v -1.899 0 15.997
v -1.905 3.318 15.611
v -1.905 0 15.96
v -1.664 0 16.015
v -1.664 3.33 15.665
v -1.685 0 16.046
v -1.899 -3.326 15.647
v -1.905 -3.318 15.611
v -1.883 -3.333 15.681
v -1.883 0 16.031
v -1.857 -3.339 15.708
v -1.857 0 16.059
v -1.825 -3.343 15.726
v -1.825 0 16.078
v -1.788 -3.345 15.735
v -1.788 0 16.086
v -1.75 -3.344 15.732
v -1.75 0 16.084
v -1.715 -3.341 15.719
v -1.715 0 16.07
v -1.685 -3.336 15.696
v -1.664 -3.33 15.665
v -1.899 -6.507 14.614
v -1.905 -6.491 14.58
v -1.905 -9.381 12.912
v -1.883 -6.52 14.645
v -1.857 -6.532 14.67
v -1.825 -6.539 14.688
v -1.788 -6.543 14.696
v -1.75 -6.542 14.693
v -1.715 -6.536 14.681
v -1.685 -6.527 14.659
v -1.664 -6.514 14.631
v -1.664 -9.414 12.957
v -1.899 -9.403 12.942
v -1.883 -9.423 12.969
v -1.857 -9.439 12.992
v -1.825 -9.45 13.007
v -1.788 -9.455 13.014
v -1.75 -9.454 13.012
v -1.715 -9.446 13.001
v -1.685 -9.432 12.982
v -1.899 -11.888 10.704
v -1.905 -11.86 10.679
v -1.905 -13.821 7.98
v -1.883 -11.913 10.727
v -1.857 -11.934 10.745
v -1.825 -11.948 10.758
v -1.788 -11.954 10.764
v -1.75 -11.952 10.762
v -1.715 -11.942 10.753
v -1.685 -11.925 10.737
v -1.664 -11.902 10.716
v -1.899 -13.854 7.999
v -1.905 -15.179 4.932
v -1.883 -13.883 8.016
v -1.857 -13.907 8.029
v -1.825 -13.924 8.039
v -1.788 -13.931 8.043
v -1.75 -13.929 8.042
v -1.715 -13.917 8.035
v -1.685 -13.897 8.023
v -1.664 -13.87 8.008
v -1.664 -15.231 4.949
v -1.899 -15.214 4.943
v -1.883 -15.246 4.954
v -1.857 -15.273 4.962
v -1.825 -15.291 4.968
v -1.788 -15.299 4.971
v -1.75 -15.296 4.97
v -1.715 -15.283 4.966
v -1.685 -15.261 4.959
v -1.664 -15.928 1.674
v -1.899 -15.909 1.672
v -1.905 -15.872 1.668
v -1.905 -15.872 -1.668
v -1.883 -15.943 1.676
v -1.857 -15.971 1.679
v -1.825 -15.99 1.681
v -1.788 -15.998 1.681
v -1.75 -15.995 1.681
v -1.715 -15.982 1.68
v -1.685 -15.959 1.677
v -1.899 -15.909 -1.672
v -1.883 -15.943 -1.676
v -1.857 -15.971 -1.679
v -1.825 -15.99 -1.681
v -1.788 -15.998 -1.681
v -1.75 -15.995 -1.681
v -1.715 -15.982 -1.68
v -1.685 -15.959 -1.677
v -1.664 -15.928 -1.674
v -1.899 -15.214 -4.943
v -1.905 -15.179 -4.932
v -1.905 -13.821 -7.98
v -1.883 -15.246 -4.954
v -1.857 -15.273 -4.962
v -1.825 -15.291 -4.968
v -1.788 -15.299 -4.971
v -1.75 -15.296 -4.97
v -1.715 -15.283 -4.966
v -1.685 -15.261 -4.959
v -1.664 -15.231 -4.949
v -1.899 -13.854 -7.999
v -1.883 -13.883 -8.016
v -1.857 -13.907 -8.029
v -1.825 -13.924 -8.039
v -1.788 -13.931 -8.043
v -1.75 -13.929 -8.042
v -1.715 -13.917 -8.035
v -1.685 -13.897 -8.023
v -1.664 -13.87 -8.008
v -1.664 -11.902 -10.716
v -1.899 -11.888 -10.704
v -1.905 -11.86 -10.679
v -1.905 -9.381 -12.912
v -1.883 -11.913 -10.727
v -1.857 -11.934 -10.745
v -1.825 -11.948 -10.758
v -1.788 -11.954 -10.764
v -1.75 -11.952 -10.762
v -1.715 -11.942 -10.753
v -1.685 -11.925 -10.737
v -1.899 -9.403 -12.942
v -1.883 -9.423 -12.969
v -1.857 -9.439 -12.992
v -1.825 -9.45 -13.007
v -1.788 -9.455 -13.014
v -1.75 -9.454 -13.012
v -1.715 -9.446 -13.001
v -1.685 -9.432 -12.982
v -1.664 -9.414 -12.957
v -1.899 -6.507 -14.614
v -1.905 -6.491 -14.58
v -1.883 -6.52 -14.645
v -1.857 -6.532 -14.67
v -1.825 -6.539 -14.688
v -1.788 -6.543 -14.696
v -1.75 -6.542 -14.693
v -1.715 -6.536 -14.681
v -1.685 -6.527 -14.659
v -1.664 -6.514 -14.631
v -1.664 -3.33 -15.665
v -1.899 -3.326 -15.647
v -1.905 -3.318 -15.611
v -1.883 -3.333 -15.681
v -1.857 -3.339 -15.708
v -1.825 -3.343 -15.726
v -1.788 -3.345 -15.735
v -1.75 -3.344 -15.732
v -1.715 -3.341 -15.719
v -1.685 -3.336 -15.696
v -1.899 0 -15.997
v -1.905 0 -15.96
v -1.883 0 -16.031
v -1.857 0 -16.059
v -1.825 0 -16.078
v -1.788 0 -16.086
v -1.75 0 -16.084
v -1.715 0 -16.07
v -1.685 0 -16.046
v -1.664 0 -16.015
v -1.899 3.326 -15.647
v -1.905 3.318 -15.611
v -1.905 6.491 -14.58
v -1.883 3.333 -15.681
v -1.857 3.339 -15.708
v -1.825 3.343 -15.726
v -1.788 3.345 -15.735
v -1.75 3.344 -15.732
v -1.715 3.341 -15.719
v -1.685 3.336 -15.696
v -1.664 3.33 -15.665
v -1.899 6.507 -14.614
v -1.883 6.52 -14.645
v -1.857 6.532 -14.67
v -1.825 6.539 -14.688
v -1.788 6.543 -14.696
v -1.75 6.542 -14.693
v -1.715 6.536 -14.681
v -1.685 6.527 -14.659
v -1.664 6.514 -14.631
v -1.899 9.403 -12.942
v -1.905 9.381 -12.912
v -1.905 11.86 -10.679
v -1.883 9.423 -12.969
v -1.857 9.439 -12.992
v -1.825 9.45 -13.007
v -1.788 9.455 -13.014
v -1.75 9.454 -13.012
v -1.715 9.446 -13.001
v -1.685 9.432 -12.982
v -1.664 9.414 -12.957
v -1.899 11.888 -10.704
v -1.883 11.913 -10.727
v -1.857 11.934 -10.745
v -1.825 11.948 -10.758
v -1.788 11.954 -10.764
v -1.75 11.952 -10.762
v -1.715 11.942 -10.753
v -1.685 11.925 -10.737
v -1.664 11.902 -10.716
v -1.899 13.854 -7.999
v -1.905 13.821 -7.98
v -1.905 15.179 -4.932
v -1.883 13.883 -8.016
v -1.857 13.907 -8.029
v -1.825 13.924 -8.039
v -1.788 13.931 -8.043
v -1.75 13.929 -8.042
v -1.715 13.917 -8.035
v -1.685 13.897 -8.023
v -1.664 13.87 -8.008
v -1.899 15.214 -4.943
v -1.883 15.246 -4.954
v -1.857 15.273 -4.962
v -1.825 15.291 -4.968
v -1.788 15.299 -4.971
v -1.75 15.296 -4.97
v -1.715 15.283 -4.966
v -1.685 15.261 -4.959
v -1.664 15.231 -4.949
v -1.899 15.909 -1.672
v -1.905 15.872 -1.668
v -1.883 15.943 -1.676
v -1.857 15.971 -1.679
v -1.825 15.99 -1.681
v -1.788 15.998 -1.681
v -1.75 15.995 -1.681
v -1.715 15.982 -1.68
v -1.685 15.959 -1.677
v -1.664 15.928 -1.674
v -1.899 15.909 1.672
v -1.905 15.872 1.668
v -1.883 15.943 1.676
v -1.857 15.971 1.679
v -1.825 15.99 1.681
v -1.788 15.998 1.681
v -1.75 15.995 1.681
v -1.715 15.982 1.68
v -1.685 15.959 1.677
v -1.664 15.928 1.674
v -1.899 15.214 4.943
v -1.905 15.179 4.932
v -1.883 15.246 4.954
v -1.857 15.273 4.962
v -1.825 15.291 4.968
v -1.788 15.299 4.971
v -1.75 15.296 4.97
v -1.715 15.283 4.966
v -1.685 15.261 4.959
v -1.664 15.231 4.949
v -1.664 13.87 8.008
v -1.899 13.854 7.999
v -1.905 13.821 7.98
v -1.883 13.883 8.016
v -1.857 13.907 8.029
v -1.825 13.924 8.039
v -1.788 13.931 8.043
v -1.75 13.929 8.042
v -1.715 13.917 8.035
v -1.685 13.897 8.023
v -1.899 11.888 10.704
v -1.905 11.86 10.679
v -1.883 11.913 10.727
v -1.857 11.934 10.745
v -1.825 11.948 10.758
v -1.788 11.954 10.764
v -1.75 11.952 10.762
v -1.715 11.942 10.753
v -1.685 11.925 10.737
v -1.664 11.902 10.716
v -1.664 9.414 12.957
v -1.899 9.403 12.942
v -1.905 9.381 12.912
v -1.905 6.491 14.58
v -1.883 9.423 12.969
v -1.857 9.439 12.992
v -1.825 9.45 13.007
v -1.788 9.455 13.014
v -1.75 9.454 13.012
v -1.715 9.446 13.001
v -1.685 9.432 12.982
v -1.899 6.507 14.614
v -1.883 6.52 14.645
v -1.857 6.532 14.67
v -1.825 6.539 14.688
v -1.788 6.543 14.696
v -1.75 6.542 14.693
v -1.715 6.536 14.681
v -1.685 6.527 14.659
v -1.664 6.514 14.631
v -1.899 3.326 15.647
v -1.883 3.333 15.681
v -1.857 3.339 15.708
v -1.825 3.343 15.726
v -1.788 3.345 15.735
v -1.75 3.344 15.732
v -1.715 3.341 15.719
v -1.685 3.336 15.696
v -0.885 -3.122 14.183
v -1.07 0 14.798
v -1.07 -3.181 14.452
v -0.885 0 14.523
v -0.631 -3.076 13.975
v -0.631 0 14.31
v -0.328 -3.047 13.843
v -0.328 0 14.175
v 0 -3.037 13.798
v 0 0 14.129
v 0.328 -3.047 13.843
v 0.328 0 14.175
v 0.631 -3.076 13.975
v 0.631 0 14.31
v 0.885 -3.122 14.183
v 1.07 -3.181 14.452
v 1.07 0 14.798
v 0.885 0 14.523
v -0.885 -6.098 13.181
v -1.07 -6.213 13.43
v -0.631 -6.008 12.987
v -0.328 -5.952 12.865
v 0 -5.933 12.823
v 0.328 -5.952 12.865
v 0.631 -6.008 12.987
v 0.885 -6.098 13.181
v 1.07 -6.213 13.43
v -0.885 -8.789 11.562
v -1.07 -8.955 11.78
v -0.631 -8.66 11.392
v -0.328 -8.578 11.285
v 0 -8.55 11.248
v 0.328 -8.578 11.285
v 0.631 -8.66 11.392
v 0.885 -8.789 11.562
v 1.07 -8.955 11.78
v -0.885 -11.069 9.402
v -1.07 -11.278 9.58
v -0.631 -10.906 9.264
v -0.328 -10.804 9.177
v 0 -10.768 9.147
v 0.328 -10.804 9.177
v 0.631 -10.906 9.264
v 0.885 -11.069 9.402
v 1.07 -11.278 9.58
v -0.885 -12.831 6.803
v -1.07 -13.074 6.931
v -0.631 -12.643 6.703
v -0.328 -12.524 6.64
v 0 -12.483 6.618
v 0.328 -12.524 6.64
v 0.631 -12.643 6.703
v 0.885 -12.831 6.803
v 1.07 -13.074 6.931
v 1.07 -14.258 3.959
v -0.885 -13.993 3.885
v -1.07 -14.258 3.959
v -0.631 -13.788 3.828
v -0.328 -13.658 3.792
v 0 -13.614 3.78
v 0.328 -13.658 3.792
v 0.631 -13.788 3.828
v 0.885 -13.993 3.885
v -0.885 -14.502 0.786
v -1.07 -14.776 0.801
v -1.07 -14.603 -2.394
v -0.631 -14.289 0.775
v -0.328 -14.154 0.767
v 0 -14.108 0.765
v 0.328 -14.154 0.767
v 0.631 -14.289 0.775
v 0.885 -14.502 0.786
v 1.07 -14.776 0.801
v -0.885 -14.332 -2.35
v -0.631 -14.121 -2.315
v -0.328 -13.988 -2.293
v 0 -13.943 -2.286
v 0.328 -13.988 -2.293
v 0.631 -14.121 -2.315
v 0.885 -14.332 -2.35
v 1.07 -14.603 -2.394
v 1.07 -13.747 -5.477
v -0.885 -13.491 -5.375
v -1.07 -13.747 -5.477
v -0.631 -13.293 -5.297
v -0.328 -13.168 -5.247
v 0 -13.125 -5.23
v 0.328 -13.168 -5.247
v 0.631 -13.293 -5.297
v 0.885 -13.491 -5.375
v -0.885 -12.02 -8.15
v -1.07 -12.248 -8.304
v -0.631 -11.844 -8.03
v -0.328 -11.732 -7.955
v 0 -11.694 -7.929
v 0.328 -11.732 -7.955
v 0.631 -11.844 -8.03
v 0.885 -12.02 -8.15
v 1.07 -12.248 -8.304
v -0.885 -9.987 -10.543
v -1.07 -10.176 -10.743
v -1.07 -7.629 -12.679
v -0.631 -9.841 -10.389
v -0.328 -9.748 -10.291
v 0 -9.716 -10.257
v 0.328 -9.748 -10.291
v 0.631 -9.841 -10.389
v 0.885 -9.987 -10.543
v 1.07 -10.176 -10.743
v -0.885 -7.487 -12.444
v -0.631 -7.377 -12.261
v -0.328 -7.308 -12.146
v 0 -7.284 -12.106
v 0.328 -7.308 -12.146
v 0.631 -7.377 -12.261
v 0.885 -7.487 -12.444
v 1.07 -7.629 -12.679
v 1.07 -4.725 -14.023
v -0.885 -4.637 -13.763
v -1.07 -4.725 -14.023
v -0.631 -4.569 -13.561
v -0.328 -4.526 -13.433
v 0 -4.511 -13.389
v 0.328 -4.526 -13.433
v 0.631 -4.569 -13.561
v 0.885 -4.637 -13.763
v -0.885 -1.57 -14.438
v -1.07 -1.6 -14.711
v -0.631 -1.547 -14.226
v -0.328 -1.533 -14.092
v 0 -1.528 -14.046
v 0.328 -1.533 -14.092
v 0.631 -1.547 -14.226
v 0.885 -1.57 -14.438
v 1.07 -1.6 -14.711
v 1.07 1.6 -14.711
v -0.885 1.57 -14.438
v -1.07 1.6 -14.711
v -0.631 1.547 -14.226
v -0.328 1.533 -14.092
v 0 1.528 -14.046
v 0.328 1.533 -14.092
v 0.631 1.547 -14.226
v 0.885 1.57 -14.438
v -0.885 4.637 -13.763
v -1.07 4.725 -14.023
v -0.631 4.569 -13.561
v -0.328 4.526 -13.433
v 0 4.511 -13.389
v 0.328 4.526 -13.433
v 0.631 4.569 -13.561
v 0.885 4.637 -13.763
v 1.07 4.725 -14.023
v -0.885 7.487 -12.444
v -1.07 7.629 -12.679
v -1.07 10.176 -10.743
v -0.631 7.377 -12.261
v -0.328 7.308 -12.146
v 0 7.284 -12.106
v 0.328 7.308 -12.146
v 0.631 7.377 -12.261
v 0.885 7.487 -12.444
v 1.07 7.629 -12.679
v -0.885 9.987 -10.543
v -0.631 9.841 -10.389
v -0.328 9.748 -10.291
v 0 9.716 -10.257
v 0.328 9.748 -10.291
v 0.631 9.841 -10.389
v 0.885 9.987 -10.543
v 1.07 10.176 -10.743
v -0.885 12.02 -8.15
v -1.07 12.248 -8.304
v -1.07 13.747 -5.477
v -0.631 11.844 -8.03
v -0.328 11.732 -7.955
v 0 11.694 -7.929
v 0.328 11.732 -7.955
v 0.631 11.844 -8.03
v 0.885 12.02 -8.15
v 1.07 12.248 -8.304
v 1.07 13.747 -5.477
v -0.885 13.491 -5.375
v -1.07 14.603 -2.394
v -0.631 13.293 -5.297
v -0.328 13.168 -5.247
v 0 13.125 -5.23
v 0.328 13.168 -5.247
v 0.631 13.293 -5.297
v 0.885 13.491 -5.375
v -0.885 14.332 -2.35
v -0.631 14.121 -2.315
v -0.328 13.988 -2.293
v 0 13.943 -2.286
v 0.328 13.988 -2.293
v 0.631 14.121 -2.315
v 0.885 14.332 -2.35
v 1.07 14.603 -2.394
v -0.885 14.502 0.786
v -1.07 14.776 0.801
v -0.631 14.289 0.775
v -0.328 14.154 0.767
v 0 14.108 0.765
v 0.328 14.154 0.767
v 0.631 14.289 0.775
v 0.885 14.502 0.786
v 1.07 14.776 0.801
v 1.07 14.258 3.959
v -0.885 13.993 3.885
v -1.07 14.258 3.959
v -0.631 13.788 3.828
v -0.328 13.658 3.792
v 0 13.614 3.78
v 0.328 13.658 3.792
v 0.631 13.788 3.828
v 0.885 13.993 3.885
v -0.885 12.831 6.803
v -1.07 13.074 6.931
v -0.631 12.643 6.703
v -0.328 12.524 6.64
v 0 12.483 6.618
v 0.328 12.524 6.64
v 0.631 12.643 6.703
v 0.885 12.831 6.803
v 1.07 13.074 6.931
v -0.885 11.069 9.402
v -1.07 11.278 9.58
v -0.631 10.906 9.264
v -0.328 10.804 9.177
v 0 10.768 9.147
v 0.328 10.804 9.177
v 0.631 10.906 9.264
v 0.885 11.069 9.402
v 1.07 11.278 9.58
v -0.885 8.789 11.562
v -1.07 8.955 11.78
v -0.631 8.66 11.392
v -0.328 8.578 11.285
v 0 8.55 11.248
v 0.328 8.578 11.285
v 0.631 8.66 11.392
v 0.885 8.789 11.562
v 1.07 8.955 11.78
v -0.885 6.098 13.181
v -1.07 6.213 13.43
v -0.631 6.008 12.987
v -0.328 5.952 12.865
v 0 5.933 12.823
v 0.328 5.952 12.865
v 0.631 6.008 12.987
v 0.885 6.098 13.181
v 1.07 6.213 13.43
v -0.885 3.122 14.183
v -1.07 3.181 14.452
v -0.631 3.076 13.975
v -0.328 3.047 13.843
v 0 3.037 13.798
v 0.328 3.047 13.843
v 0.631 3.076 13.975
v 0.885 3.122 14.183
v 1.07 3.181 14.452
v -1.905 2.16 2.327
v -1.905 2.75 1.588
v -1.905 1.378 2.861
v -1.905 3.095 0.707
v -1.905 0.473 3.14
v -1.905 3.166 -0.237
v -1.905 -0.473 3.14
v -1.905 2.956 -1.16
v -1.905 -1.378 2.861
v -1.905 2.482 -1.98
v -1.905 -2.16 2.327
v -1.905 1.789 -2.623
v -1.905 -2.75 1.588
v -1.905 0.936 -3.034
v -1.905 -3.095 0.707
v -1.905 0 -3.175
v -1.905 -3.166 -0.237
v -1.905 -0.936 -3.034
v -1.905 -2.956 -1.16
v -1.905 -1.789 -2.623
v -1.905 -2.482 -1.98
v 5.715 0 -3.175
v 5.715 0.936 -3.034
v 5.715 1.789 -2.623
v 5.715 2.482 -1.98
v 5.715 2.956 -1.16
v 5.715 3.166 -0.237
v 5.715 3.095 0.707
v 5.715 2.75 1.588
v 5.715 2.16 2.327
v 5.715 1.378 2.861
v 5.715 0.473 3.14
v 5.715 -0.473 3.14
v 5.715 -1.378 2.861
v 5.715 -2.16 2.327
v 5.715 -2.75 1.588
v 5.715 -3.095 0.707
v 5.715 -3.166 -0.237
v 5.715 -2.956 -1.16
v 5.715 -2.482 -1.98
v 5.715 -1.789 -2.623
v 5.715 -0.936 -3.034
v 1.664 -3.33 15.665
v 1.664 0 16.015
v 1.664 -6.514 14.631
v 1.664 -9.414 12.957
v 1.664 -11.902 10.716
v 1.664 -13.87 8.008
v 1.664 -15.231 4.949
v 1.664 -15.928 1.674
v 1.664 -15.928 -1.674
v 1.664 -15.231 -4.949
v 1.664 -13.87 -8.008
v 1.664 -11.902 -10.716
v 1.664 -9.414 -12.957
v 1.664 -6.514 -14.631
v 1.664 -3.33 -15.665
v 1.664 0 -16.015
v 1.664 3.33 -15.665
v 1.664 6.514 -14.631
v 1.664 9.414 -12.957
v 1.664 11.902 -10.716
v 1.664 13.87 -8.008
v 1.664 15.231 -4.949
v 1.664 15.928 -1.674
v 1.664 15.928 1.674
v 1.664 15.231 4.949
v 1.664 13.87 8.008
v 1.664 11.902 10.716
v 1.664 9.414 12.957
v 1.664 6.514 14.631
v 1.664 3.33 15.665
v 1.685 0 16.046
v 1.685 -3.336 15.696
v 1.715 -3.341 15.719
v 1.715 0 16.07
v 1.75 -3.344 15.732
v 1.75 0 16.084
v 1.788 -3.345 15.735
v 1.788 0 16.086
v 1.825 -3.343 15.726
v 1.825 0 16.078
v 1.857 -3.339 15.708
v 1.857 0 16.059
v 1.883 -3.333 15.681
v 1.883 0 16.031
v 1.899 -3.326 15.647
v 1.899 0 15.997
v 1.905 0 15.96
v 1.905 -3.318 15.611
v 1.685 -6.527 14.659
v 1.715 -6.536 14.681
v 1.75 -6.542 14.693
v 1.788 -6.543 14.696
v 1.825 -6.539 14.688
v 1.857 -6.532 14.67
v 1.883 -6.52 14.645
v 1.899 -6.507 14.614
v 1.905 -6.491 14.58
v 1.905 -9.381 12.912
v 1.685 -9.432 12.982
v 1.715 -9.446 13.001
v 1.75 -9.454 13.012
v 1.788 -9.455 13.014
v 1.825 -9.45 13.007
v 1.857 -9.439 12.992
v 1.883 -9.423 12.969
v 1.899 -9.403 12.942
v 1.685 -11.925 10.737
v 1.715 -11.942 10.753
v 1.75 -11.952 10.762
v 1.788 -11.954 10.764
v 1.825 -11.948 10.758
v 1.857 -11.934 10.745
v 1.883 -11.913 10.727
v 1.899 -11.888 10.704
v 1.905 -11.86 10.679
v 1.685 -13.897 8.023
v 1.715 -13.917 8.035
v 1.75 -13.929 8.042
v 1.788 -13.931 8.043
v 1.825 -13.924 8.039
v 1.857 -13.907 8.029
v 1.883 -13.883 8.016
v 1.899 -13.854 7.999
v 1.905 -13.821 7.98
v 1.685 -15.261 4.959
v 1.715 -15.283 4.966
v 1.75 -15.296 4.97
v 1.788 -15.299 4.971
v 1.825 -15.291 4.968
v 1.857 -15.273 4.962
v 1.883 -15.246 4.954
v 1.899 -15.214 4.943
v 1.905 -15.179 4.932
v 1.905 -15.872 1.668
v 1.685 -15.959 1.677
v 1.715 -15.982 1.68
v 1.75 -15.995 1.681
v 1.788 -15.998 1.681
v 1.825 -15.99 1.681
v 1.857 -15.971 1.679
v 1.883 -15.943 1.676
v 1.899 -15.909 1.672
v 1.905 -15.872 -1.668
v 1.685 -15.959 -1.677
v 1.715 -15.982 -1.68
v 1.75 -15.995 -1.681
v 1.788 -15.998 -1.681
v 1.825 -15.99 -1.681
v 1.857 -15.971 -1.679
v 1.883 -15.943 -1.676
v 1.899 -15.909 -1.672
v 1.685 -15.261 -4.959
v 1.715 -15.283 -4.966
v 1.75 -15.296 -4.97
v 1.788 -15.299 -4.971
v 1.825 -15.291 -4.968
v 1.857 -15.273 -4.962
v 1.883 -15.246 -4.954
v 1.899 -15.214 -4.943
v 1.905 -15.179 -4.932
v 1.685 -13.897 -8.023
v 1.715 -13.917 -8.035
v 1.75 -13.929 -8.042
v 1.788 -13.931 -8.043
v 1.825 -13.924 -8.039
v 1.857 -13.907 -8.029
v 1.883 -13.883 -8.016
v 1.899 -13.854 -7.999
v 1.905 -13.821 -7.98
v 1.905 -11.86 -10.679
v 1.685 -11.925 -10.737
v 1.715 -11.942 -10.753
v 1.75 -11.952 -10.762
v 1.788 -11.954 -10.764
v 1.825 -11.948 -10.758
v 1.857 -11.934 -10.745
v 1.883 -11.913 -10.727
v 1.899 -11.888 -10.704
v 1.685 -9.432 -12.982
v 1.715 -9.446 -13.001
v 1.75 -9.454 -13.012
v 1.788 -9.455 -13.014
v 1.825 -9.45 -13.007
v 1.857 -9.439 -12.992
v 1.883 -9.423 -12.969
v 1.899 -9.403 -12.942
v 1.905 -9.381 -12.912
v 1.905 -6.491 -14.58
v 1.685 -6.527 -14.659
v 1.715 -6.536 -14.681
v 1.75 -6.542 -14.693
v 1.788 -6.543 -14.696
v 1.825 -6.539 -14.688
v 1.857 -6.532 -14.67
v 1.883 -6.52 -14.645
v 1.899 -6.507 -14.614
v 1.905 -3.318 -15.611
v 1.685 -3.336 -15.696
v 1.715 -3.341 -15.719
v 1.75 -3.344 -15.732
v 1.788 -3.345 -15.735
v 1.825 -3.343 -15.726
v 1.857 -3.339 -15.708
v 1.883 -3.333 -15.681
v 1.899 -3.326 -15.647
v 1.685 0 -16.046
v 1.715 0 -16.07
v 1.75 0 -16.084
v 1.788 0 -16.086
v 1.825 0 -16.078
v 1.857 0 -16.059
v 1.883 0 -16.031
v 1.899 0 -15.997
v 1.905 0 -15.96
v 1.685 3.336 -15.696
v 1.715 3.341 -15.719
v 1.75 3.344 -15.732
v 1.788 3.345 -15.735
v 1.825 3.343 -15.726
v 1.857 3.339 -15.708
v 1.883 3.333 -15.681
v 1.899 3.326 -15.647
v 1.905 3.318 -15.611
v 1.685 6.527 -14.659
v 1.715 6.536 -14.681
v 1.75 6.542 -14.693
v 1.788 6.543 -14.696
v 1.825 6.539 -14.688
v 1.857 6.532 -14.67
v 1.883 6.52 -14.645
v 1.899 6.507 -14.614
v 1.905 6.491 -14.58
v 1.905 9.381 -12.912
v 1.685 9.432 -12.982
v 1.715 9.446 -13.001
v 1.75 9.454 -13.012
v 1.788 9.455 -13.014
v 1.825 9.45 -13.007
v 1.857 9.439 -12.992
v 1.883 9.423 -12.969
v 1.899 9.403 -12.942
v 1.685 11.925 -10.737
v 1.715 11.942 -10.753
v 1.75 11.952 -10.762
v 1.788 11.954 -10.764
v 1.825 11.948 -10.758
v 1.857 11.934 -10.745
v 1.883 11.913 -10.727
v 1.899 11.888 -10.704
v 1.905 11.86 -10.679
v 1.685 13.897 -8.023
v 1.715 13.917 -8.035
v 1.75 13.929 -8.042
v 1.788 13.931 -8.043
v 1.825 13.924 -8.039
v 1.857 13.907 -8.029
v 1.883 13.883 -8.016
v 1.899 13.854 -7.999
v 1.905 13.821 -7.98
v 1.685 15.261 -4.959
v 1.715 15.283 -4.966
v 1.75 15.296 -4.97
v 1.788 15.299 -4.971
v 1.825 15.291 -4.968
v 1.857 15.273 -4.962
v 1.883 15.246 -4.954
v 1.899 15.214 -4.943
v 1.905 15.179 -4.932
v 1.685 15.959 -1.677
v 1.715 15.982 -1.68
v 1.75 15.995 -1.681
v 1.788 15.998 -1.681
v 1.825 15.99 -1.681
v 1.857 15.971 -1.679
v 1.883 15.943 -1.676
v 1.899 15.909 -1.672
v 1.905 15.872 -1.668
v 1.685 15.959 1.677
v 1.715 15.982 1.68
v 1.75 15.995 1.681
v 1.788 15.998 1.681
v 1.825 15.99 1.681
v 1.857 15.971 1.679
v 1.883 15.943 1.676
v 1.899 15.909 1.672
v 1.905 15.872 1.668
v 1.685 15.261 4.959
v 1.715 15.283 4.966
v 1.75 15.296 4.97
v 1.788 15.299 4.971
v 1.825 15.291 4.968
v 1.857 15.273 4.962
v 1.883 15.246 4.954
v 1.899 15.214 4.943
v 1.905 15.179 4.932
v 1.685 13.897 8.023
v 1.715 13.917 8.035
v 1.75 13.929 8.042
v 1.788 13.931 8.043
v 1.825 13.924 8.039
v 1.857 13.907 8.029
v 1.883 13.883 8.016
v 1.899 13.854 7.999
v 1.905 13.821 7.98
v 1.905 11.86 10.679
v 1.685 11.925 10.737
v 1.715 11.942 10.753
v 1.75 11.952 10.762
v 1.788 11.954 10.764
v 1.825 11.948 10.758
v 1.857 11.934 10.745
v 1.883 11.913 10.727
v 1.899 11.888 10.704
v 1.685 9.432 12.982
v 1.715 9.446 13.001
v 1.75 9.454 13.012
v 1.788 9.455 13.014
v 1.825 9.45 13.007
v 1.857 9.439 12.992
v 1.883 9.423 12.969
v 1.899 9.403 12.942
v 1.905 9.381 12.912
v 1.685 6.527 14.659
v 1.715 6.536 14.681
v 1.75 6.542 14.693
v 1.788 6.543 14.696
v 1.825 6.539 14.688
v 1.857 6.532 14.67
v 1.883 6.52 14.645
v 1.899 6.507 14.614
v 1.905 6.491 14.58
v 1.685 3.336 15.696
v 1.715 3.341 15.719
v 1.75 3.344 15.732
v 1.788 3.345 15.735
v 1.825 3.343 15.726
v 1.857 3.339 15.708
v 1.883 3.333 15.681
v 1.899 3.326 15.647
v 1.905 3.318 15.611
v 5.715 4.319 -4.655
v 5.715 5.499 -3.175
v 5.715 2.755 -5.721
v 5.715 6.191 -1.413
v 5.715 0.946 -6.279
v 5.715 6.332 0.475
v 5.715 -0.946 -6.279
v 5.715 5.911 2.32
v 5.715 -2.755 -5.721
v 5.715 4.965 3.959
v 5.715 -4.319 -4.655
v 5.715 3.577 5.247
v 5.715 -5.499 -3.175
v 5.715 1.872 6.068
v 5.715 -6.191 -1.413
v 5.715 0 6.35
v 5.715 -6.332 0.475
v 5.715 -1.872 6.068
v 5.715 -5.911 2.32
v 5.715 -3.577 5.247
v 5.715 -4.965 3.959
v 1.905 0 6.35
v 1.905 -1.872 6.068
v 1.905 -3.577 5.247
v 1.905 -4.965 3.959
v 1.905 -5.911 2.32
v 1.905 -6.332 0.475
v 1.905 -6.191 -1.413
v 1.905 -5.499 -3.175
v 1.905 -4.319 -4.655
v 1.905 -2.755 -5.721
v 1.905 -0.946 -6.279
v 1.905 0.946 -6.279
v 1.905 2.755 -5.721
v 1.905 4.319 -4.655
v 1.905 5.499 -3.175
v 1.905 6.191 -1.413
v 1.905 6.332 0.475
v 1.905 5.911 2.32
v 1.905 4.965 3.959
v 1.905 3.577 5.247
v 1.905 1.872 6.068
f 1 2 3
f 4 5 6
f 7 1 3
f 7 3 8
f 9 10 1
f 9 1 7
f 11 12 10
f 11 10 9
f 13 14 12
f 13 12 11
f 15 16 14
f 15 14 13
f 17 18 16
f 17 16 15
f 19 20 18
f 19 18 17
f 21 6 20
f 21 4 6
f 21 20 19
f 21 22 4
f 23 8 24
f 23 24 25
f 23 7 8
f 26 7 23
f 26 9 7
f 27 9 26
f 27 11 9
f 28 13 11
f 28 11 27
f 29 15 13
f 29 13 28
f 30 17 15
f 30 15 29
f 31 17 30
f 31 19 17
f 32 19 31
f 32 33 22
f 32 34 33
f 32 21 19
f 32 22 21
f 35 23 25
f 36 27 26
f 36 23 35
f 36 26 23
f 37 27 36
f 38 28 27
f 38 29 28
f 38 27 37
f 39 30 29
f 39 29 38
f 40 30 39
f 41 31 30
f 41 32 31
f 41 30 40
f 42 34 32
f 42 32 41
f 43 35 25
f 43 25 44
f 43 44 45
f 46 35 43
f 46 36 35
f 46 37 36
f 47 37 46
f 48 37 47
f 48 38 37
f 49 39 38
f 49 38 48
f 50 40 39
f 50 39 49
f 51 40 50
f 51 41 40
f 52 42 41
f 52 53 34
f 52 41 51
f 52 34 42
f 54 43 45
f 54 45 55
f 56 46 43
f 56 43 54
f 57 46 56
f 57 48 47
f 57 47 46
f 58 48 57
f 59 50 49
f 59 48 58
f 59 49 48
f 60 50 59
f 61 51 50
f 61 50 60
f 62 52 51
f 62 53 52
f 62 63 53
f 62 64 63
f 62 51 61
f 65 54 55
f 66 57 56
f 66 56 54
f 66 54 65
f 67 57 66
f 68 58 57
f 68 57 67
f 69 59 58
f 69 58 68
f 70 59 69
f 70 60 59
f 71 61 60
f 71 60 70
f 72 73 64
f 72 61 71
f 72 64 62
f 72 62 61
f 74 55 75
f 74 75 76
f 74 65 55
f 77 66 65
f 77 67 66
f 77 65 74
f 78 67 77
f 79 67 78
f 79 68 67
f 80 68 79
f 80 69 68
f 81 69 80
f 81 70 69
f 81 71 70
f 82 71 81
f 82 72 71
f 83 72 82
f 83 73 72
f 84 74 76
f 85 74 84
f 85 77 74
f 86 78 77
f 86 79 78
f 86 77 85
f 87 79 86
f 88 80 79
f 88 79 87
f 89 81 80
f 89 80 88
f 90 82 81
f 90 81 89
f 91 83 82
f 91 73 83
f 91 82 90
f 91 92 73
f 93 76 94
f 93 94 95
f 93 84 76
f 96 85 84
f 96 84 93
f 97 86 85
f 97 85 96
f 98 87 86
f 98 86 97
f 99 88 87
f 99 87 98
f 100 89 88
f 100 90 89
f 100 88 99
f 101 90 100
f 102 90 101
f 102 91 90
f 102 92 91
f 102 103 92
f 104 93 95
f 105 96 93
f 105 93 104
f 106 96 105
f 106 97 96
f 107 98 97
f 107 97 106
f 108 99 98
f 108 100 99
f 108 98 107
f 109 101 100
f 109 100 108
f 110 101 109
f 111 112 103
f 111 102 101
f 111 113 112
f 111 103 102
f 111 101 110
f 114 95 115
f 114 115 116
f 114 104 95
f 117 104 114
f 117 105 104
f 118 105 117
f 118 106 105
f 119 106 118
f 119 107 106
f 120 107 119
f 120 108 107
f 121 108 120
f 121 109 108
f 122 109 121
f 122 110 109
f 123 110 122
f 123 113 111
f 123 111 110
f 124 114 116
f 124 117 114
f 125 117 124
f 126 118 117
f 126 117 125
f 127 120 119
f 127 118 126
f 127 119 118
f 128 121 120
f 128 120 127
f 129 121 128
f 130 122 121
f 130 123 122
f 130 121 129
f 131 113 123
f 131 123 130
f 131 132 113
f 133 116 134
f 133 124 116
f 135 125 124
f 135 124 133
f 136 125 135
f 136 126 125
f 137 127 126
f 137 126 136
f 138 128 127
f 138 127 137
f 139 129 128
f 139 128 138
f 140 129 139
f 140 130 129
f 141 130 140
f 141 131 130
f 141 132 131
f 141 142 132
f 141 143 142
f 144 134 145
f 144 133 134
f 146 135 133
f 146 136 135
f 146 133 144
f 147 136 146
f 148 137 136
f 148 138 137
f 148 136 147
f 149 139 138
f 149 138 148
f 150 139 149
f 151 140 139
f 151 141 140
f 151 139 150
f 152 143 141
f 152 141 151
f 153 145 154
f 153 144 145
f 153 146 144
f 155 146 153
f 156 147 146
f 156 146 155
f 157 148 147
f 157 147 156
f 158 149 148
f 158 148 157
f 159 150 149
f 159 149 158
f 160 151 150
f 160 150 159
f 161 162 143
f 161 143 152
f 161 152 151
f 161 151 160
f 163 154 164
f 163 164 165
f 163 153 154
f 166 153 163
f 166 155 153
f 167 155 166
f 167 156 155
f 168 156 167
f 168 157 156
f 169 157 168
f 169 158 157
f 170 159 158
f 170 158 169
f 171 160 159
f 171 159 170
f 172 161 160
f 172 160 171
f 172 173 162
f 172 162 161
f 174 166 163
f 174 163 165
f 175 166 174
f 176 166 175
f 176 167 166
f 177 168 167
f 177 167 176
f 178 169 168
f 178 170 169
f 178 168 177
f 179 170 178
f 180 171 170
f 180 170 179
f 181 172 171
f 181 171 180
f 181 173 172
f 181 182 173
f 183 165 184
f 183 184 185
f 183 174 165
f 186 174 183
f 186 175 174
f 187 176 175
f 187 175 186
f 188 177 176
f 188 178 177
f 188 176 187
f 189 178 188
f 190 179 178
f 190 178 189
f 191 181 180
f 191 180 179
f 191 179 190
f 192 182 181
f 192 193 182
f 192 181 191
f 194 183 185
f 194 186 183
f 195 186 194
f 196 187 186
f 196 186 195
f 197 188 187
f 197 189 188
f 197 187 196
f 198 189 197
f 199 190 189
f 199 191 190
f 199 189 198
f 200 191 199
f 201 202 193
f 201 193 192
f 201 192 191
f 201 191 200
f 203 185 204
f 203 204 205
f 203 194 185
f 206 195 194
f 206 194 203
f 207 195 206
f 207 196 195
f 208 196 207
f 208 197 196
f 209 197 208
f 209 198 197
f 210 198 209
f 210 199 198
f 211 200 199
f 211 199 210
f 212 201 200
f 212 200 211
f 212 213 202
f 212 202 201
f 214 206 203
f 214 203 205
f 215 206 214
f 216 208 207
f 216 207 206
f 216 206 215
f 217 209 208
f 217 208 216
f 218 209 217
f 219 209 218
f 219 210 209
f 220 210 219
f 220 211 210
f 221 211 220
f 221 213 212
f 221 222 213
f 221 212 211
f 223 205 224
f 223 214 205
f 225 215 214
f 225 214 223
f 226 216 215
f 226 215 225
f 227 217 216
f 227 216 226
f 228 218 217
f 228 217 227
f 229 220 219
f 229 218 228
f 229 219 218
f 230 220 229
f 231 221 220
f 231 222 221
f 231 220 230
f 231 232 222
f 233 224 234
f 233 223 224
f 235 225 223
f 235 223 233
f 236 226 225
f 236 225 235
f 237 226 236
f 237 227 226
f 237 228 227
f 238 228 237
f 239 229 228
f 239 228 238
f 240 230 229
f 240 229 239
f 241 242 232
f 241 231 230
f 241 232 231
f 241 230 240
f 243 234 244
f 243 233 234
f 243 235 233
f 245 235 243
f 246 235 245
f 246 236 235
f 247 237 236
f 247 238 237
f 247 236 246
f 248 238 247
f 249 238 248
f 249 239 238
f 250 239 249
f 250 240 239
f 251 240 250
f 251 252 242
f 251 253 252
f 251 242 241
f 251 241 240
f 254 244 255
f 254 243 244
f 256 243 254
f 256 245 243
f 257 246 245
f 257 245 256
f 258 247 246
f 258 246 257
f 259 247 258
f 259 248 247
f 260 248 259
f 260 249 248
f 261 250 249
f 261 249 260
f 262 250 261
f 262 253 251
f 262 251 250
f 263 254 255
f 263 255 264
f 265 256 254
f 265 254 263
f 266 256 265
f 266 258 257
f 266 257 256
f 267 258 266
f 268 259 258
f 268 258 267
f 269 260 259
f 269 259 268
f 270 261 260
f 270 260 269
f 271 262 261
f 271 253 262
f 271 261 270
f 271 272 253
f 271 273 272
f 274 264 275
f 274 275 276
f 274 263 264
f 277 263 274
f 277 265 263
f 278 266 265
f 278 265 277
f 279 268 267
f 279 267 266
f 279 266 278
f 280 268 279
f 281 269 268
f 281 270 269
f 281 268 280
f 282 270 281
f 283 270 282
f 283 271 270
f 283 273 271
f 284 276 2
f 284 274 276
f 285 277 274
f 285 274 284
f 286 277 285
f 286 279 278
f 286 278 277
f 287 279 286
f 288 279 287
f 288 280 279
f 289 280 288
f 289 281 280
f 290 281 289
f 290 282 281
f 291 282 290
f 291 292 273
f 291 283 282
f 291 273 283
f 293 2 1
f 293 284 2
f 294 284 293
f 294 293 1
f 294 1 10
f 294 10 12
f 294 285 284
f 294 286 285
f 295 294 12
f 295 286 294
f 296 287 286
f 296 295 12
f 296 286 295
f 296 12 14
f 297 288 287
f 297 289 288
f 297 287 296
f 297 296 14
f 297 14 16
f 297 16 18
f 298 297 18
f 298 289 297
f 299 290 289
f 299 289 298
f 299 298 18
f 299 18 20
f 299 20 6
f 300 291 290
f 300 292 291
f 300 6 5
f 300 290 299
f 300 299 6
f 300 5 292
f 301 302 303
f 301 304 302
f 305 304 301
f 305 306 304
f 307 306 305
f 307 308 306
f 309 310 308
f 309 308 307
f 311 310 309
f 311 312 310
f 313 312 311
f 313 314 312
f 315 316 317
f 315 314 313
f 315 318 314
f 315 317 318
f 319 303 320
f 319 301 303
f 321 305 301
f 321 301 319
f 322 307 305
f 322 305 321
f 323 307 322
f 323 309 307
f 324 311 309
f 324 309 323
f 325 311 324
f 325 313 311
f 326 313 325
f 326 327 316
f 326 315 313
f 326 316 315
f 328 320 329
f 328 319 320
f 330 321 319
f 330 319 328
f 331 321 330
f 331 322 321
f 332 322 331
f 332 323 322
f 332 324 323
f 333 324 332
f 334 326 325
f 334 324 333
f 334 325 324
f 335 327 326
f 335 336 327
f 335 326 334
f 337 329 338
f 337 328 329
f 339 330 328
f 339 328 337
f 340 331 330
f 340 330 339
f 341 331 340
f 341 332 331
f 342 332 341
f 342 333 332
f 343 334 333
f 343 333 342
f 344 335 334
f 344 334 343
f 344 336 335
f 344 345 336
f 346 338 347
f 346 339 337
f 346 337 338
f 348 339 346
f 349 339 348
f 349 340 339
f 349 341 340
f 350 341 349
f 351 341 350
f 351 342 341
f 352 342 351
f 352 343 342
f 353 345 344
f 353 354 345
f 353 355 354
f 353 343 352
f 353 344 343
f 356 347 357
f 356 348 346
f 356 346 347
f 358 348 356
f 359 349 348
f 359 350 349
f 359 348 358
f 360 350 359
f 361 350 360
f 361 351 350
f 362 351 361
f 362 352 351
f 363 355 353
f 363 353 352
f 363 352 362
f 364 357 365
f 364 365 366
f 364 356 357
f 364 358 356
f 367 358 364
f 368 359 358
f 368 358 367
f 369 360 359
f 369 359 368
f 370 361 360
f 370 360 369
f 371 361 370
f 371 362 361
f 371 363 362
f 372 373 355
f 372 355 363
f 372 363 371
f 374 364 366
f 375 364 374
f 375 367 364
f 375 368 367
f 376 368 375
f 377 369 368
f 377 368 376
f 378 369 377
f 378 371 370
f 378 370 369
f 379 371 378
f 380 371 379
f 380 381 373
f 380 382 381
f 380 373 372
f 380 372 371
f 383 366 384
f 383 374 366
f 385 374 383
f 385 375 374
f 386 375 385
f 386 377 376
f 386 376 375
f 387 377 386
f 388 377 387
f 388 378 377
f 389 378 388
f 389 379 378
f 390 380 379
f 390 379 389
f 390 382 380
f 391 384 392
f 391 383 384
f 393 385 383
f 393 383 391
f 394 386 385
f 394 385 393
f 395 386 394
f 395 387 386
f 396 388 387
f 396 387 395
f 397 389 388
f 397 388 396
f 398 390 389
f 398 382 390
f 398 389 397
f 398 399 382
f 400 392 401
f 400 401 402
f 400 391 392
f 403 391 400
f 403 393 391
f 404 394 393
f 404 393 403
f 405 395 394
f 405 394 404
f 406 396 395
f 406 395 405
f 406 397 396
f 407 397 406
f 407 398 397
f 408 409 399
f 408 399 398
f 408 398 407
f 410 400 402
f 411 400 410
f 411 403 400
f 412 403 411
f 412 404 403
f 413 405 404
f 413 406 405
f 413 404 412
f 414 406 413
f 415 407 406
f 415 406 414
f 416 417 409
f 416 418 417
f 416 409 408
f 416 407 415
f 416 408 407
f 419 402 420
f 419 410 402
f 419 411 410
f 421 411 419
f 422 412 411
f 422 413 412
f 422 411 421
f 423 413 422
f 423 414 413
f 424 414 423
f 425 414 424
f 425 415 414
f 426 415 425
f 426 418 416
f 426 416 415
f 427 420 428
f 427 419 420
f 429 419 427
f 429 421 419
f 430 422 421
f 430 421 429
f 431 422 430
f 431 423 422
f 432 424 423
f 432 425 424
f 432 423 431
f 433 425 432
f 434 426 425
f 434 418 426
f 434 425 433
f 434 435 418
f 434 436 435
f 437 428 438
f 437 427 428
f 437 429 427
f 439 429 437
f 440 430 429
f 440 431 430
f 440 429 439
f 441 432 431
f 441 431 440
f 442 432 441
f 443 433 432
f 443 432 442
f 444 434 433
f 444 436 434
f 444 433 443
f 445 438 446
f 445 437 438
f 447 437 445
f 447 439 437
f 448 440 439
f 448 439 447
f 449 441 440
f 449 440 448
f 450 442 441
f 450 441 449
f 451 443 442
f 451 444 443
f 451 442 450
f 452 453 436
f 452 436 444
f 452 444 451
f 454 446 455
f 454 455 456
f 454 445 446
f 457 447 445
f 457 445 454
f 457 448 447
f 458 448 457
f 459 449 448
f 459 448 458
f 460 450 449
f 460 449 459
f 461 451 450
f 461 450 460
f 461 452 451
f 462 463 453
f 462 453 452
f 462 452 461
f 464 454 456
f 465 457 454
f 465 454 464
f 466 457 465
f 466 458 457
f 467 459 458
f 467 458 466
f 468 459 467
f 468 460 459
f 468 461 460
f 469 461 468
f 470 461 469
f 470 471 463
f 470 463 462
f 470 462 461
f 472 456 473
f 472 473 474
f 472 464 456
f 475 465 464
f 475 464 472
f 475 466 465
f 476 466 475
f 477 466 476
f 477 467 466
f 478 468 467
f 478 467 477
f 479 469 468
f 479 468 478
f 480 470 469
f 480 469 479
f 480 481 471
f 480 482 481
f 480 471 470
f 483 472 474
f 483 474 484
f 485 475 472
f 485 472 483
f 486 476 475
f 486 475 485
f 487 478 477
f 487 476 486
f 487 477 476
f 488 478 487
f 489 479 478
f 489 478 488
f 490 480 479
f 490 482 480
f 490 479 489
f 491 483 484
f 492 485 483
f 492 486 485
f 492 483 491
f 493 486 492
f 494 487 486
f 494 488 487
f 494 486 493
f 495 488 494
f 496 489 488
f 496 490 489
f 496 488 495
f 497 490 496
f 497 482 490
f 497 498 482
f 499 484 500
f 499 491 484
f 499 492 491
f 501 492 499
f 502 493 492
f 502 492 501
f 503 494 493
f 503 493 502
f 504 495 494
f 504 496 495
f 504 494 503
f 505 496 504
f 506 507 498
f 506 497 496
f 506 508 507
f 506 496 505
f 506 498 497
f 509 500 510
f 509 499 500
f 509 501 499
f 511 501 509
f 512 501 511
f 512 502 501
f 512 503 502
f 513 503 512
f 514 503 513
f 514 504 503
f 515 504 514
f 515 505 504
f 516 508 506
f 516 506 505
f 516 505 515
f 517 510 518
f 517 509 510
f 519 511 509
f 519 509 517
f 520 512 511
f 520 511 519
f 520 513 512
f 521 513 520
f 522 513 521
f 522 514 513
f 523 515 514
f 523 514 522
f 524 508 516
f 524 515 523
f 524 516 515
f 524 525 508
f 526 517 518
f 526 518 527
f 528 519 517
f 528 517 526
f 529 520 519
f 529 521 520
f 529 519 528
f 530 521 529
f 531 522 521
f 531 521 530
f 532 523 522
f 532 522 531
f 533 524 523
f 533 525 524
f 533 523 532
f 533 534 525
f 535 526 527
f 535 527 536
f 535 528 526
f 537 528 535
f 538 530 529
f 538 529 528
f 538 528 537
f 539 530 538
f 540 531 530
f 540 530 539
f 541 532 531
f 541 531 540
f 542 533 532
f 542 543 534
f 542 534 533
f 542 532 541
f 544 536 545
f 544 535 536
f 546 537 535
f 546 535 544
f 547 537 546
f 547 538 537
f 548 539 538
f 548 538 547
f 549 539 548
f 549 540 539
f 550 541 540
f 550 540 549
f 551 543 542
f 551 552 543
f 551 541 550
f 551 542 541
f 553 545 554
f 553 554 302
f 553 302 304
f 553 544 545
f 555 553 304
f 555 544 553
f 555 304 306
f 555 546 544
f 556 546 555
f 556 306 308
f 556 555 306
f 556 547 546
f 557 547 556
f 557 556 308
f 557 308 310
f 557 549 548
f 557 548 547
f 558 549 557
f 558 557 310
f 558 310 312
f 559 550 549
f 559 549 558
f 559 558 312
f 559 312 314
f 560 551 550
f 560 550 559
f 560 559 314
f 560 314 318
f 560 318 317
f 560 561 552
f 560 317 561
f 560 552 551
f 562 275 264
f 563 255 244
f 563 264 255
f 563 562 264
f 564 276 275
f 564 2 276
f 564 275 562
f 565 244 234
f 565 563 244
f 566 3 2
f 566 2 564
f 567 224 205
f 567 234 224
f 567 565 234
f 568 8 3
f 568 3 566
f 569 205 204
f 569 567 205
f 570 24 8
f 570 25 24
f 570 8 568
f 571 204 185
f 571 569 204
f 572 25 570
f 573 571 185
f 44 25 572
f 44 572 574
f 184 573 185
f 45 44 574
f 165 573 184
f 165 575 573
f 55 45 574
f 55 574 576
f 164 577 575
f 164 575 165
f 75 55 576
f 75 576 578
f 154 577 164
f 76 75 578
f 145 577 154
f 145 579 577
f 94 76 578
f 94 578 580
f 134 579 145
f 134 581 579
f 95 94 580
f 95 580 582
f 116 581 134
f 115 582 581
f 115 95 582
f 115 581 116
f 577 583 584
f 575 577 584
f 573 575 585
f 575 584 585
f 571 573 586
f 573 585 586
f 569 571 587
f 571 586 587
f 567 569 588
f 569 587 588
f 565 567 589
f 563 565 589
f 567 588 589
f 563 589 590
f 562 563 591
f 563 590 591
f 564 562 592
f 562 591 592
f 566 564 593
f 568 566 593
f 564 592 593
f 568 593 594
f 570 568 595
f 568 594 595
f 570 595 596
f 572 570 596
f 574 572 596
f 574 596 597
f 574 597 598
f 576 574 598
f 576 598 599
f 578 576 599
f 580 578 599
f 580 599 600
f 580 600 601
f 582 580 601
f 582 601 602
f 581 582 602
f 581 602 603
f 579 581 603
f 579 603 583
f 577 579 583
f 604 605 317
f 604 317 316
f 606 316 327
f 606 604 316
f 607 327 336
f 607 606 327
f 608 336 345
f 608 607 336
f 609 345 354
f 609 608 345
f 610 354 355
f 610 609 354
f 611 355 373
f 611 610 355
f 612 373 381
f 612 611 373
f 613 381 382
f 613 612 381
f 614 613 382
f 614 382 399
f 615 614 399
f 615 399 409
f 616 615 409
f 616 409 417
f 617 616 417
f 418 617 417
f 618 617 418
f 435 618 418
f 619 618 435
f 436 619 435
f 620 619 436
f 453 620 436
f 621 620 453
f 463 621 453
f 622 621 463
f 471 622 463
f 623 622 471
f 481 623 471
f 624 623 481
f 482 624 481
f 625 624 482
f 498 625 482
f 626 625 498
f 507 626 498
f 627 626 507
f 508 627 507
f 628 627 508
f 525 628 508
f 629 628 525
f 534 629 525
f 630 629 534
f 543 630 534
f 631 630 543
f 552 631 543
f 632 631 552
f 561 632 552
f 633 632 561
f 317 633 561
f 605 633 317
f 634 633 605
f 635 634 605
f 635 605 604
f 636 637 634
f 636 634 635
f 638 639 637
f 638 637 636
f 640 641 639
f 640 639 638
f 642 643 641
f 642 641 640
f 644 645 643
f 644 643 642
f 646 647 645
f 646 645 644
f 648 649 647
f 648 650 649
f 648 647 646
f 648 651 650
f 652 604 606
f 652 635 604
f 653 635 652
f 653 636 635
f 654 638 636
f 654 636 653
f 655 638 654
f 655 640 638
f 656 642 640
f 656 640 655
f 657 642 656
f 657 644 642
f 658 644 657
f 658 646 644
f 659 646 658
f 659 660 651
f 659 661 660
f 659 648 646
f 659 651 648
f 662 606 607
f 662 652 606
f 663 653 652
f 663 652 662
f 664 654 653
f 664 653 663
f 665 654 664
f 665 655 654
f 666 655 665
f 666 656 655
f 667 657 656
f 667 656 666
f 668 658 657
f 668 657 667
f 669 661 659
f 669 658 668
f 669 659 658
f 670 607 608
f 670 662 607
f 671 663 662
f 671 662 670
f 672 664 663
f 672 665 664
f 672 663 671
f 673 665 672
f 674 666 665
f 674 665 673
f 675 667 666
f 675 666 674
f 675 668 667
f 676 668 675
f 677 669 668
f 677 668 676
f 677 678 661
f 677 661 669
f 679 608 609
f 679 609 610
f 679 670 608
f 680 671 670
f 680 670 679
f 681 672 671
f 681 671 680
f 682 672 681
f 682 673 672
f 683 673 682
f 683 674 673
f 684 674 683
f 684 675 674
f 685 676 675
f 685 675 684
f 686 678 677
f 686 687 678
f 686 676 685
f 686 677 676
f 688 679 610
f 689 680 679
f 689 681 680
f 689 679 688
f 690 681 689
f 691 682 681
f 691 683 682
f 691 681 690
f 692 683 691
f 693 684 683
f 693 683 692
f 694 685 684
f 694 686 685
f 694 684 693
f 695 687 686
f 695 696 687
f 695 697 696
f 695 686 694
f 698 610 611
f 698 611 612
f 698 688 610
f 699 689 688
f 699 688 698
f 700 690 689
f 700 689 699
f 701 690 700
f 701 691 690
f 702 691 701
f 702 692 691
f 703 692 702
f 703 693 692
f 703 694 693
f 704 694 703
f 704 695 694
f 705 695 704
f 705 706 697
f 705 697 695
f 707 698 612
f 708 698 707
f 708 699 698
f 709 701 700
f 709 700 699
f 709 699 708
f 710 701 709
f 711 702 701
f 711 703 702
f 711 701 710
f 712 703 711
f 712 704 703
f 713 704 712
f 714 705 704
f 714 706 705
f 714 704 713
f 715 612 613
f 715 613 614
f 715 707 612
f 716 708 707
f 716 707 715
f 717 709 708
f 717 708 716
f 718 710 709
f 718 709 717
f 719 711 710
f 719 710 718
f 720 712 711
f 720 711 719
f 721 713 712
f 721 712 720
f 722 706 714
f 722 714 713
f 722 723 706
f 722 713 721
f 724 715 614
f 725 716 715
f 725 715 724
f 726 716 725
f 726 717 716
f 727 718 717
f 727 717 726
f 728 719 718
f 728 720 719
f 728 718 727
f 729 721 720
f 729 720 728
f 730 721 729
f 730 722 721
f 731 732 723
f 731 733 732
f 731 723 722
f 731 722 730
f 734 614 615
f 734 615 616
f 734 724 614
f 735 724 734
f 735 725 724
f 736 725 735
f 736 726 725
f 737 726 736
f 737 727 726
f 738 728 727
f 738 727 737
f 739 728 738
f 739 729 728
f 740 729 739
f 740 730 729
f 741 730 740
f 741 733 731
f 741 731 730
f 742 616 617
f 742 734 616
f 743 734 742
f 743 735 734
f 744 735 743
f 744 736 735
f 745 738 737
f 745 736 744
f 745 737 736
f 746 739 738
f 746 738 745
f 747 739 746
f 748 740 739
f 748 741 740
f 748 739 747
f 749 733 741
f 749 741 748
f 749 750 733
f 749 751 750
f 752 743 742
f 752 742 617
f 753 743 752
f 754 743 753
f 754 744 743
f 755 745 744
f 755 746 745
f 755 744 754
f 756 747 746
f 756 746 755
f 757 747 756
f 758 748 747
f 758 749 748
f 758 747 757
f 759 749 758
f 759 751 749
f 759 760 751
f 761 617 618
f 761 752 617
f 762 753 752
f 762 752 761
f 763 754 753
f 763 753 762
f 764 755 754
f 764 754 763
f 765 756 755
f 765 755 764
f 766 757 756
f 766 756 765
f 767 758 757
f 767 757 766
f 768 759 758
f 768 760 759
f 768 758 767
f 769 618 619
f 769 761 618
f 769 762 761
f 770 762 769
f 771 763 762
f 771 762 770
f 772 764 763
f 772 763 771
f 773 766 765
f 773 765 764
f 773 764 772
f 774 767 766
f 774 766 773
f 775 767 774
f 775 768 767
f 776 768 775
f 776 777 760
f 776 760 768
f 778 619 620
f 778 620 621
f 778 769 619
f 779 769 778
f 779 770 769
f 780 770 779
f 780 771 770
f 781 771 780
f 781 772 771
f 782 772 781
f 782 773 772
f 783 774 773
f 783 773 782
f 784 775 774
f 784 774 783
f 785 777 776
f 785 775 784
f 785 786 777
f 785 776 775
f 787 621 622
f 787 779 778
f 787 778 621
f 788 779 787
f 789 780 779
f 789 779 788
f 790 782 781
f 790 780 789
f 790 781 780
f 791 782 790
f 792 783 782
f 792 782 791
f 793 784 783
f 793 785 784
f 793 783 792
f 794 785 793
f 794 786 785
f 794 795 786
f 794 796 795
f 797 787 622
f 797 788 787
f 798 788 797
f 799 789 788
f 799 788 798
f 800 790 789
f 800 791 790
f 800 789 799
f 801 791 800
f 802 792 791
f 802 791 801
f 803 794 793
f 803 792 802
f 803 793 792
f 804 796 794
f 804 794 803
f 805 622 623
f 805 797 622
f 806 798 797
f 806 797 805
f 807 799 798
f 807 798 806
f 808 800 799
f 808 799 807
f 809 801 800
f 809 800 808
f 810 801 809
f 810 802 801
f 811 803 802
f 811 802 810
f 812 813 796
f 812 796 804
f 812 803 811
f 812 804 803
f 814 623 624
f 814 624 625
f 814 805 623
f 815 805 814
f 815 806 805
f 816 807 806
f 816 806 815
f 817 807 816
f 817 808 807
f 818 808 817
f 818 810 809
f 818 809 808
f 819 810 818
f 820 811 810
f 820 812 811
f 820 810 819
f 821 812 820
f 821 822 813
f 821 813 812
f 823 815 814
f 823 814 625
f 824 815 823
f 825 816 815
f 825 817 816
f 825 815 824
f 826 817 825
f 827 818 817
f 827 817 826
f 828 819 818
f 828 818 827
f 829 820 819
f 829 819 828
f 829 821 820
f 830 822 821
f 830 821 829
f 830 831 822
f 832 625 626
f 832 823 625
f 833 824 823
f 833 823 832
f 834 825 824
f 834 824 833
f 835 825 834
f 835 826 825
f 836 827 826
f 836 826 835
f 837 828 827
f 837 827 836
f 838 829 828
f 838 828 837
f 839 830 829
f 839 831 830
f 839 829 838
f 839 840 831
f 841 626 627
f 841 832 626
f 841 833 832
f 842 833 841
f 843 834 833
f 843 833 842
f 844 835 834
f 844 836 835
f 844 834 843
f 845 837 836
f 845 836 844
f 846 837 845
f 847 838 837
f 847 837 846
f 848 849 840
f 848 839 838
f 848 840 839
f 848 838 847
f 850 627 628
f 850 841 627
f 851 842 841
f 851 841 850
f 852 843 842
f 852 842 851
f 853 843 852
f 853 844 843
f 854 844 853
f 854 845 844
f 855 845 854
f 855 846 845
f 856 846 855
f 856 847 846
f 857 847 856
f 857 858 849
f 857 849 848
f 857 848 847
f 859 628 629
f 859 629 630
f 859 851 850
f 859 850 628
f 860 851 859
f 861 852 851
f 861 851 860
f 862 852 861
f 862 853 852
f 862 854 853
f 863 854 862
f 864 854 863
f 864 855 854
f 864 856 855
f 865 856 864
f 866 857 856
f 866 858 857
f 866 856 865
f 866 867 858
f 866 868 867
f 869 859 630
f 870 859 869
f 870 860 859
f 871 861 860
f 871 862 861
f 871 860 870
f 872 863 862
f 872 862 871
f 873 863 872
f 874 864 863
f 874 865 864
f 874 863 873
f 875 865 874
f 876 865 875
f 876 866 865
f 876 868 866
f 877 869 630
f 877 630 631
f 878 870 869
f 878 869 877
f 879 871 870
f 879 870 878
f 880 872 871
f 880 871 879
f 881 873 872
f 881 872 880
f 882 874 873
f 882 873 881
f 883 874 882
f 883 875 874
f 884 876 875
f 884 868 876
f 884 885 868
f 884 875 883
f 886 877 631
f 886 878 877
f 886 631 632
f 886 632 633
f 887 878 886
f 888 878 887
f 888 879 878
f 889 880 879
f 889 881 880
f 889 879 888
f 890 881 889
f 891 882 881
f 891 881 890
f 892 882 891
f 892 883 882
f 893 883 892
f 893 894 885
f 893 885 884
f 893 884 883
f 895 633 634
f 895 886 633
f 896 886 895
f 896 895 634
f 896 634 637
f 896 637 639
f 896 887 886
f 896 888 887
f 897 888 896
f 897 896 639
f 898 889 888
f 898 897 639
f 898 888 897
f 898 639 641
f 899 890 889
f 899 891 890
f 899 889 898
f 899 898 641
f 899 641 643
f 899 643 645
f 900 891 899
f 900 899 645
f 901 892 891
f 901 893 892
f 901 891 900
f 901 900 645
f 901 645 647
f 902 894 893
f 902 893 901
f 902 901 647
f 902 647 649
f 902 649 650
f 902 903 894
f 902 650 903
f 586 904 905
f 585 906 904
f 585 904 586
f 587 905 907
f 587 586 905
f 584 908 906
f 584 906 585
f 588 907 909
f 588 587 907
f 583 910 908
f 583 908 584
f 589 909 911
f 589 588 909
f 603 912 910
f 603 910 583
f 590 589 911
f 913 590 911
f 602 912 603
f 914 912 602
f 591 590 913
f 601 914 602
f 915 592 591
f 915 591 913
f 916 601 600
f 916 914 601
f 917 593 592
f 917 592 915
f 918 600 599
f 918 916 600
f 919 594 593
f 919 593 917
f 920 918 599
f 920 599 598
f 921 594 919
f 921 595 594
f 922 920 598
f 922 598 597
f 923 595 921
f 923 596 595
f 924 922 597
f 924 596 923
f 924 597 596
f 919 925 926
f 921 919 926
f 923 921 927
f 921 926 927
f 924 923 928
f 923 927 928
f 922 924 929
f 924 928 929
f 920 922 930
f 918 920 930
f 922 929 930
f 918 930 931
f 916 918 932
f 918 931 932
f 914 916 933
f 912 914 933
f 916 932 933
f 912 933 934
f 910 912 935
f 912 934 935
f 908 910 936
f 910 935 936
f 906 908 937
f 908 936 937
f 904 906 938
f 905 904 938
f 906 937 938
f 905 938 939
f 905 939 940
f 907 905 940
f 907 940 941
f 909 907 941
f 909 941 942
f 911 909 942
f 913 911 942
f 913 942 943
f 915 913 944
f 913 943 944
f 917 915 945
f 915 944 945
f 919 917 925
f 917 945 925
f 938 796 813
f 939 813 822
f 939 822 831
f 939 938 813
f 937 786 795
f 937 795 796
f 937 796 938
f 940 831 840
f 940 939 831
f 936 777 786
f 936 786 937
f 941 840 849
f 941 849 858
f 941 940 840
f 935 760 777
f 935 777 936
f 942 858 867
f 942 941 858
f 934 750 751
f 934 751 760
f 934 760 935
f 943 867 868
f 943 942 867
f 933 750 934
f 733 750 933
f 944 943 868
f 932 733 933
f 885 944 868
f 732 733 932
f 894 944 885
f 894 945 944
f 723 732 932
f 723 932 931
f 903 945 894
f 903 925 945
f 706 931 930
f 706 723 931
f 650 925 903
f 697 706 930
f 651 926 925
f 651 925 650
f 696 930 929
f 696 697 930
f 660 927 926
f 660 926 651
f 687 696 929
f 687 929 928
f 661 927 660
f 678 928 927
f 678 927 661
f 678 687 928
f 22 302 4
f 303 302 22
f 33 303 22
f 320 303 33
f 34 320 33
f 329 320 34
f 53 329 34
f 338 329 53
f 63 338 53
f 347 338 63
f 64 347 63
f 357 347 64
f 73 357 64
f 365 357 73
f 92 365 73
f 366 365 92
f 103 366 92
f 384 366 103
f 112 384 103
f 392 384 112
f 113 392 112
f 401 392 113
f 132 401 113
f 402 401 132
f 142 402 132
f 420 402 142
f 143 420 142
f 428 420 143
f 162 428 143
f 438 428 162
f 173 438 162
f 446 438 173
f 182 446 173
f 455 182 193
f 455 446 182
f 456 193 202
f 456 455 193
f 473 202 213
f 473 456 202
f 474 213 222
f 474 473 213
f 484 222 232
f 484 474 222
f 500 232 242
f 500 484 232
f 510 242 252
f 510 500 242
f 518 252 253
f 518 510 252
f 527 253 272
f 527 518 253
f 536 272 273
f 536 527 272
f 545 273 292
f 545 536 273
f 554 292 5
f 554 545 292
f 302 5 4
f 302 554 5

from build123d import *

# Parameters (mm, degrees)
FILLET1_R           = 0.127
SKETCH2_R           = 6.35
BOSS_EXTRUDE1_DEPTH = 3.81
SKETCH3_R           = 3.175
CUT_EXTRUDE1_DEPTH  = 24.992209055


with BuildPart() as part:
    # Sketch1 → Revolve1 (revolve)
    with BuildSketch(Plane.XY, mode=Mode.PRIVATE) as revolve1_sk:
        with BuildLine():
            Line((-1.905, 0), (-1.905, 16.51))
            Line((-1.905, 16.51), (-1.070224719, 14.797640449))
            ThreePointArc((-1.070224719, 14.797640449), (0, 14.12875), (1.070224719, 14.797640449))
            Line((1.070224719, 14.797640449), (1.905, 16.51))
            Line((1.905, 16.51), (1.905, 0))
            Line((1.905, 0), (-1.905, 0))
        make_face()
    revolve(revolve1_sk.sketch.rotate(Axis((-602.921612104, 0, 0), (1, 0, 0)), 90), axis=Axis((-602.921612104, 0, 0), (1, 0, 0)))

    # Fillet1
    fillet1_edges = [part.edges().sort_by_distance(p)[0] for p in [
        (1.905, 0, -16.51),
        (-1.905, 0, -16.51),
    ]]
    fillet(fillet1_edges, radius=FILLET1_R)

    # Sketch2 → Boss-Extrude1 (add)
    with BuildSketch(Plane(origin=(1.905, 0, 0), x_dir=(0, 0, -1), z_dir=(1, 0, 0))):
        with Locations(Location((0, 0, 0), (0, 0, 180))):
            Circle(SKETCH2_R)
    extrude(amount=BOSS_EXTRUDE1_DEPTH)

    # Sketch3 → Cut-Extrude1 (cut, through all)
    with BuildSketch(Plane(origin=(5.715, 0, 0), x_dir=(0, 0, -1), z_dir=(1, 0, 0))):
        Circle(SKETCH3_R)
    extrude(amount=-CUT_EXTRUDE1_DEPTH, mode=Mode.SUBTRACT)


solid = part.part
